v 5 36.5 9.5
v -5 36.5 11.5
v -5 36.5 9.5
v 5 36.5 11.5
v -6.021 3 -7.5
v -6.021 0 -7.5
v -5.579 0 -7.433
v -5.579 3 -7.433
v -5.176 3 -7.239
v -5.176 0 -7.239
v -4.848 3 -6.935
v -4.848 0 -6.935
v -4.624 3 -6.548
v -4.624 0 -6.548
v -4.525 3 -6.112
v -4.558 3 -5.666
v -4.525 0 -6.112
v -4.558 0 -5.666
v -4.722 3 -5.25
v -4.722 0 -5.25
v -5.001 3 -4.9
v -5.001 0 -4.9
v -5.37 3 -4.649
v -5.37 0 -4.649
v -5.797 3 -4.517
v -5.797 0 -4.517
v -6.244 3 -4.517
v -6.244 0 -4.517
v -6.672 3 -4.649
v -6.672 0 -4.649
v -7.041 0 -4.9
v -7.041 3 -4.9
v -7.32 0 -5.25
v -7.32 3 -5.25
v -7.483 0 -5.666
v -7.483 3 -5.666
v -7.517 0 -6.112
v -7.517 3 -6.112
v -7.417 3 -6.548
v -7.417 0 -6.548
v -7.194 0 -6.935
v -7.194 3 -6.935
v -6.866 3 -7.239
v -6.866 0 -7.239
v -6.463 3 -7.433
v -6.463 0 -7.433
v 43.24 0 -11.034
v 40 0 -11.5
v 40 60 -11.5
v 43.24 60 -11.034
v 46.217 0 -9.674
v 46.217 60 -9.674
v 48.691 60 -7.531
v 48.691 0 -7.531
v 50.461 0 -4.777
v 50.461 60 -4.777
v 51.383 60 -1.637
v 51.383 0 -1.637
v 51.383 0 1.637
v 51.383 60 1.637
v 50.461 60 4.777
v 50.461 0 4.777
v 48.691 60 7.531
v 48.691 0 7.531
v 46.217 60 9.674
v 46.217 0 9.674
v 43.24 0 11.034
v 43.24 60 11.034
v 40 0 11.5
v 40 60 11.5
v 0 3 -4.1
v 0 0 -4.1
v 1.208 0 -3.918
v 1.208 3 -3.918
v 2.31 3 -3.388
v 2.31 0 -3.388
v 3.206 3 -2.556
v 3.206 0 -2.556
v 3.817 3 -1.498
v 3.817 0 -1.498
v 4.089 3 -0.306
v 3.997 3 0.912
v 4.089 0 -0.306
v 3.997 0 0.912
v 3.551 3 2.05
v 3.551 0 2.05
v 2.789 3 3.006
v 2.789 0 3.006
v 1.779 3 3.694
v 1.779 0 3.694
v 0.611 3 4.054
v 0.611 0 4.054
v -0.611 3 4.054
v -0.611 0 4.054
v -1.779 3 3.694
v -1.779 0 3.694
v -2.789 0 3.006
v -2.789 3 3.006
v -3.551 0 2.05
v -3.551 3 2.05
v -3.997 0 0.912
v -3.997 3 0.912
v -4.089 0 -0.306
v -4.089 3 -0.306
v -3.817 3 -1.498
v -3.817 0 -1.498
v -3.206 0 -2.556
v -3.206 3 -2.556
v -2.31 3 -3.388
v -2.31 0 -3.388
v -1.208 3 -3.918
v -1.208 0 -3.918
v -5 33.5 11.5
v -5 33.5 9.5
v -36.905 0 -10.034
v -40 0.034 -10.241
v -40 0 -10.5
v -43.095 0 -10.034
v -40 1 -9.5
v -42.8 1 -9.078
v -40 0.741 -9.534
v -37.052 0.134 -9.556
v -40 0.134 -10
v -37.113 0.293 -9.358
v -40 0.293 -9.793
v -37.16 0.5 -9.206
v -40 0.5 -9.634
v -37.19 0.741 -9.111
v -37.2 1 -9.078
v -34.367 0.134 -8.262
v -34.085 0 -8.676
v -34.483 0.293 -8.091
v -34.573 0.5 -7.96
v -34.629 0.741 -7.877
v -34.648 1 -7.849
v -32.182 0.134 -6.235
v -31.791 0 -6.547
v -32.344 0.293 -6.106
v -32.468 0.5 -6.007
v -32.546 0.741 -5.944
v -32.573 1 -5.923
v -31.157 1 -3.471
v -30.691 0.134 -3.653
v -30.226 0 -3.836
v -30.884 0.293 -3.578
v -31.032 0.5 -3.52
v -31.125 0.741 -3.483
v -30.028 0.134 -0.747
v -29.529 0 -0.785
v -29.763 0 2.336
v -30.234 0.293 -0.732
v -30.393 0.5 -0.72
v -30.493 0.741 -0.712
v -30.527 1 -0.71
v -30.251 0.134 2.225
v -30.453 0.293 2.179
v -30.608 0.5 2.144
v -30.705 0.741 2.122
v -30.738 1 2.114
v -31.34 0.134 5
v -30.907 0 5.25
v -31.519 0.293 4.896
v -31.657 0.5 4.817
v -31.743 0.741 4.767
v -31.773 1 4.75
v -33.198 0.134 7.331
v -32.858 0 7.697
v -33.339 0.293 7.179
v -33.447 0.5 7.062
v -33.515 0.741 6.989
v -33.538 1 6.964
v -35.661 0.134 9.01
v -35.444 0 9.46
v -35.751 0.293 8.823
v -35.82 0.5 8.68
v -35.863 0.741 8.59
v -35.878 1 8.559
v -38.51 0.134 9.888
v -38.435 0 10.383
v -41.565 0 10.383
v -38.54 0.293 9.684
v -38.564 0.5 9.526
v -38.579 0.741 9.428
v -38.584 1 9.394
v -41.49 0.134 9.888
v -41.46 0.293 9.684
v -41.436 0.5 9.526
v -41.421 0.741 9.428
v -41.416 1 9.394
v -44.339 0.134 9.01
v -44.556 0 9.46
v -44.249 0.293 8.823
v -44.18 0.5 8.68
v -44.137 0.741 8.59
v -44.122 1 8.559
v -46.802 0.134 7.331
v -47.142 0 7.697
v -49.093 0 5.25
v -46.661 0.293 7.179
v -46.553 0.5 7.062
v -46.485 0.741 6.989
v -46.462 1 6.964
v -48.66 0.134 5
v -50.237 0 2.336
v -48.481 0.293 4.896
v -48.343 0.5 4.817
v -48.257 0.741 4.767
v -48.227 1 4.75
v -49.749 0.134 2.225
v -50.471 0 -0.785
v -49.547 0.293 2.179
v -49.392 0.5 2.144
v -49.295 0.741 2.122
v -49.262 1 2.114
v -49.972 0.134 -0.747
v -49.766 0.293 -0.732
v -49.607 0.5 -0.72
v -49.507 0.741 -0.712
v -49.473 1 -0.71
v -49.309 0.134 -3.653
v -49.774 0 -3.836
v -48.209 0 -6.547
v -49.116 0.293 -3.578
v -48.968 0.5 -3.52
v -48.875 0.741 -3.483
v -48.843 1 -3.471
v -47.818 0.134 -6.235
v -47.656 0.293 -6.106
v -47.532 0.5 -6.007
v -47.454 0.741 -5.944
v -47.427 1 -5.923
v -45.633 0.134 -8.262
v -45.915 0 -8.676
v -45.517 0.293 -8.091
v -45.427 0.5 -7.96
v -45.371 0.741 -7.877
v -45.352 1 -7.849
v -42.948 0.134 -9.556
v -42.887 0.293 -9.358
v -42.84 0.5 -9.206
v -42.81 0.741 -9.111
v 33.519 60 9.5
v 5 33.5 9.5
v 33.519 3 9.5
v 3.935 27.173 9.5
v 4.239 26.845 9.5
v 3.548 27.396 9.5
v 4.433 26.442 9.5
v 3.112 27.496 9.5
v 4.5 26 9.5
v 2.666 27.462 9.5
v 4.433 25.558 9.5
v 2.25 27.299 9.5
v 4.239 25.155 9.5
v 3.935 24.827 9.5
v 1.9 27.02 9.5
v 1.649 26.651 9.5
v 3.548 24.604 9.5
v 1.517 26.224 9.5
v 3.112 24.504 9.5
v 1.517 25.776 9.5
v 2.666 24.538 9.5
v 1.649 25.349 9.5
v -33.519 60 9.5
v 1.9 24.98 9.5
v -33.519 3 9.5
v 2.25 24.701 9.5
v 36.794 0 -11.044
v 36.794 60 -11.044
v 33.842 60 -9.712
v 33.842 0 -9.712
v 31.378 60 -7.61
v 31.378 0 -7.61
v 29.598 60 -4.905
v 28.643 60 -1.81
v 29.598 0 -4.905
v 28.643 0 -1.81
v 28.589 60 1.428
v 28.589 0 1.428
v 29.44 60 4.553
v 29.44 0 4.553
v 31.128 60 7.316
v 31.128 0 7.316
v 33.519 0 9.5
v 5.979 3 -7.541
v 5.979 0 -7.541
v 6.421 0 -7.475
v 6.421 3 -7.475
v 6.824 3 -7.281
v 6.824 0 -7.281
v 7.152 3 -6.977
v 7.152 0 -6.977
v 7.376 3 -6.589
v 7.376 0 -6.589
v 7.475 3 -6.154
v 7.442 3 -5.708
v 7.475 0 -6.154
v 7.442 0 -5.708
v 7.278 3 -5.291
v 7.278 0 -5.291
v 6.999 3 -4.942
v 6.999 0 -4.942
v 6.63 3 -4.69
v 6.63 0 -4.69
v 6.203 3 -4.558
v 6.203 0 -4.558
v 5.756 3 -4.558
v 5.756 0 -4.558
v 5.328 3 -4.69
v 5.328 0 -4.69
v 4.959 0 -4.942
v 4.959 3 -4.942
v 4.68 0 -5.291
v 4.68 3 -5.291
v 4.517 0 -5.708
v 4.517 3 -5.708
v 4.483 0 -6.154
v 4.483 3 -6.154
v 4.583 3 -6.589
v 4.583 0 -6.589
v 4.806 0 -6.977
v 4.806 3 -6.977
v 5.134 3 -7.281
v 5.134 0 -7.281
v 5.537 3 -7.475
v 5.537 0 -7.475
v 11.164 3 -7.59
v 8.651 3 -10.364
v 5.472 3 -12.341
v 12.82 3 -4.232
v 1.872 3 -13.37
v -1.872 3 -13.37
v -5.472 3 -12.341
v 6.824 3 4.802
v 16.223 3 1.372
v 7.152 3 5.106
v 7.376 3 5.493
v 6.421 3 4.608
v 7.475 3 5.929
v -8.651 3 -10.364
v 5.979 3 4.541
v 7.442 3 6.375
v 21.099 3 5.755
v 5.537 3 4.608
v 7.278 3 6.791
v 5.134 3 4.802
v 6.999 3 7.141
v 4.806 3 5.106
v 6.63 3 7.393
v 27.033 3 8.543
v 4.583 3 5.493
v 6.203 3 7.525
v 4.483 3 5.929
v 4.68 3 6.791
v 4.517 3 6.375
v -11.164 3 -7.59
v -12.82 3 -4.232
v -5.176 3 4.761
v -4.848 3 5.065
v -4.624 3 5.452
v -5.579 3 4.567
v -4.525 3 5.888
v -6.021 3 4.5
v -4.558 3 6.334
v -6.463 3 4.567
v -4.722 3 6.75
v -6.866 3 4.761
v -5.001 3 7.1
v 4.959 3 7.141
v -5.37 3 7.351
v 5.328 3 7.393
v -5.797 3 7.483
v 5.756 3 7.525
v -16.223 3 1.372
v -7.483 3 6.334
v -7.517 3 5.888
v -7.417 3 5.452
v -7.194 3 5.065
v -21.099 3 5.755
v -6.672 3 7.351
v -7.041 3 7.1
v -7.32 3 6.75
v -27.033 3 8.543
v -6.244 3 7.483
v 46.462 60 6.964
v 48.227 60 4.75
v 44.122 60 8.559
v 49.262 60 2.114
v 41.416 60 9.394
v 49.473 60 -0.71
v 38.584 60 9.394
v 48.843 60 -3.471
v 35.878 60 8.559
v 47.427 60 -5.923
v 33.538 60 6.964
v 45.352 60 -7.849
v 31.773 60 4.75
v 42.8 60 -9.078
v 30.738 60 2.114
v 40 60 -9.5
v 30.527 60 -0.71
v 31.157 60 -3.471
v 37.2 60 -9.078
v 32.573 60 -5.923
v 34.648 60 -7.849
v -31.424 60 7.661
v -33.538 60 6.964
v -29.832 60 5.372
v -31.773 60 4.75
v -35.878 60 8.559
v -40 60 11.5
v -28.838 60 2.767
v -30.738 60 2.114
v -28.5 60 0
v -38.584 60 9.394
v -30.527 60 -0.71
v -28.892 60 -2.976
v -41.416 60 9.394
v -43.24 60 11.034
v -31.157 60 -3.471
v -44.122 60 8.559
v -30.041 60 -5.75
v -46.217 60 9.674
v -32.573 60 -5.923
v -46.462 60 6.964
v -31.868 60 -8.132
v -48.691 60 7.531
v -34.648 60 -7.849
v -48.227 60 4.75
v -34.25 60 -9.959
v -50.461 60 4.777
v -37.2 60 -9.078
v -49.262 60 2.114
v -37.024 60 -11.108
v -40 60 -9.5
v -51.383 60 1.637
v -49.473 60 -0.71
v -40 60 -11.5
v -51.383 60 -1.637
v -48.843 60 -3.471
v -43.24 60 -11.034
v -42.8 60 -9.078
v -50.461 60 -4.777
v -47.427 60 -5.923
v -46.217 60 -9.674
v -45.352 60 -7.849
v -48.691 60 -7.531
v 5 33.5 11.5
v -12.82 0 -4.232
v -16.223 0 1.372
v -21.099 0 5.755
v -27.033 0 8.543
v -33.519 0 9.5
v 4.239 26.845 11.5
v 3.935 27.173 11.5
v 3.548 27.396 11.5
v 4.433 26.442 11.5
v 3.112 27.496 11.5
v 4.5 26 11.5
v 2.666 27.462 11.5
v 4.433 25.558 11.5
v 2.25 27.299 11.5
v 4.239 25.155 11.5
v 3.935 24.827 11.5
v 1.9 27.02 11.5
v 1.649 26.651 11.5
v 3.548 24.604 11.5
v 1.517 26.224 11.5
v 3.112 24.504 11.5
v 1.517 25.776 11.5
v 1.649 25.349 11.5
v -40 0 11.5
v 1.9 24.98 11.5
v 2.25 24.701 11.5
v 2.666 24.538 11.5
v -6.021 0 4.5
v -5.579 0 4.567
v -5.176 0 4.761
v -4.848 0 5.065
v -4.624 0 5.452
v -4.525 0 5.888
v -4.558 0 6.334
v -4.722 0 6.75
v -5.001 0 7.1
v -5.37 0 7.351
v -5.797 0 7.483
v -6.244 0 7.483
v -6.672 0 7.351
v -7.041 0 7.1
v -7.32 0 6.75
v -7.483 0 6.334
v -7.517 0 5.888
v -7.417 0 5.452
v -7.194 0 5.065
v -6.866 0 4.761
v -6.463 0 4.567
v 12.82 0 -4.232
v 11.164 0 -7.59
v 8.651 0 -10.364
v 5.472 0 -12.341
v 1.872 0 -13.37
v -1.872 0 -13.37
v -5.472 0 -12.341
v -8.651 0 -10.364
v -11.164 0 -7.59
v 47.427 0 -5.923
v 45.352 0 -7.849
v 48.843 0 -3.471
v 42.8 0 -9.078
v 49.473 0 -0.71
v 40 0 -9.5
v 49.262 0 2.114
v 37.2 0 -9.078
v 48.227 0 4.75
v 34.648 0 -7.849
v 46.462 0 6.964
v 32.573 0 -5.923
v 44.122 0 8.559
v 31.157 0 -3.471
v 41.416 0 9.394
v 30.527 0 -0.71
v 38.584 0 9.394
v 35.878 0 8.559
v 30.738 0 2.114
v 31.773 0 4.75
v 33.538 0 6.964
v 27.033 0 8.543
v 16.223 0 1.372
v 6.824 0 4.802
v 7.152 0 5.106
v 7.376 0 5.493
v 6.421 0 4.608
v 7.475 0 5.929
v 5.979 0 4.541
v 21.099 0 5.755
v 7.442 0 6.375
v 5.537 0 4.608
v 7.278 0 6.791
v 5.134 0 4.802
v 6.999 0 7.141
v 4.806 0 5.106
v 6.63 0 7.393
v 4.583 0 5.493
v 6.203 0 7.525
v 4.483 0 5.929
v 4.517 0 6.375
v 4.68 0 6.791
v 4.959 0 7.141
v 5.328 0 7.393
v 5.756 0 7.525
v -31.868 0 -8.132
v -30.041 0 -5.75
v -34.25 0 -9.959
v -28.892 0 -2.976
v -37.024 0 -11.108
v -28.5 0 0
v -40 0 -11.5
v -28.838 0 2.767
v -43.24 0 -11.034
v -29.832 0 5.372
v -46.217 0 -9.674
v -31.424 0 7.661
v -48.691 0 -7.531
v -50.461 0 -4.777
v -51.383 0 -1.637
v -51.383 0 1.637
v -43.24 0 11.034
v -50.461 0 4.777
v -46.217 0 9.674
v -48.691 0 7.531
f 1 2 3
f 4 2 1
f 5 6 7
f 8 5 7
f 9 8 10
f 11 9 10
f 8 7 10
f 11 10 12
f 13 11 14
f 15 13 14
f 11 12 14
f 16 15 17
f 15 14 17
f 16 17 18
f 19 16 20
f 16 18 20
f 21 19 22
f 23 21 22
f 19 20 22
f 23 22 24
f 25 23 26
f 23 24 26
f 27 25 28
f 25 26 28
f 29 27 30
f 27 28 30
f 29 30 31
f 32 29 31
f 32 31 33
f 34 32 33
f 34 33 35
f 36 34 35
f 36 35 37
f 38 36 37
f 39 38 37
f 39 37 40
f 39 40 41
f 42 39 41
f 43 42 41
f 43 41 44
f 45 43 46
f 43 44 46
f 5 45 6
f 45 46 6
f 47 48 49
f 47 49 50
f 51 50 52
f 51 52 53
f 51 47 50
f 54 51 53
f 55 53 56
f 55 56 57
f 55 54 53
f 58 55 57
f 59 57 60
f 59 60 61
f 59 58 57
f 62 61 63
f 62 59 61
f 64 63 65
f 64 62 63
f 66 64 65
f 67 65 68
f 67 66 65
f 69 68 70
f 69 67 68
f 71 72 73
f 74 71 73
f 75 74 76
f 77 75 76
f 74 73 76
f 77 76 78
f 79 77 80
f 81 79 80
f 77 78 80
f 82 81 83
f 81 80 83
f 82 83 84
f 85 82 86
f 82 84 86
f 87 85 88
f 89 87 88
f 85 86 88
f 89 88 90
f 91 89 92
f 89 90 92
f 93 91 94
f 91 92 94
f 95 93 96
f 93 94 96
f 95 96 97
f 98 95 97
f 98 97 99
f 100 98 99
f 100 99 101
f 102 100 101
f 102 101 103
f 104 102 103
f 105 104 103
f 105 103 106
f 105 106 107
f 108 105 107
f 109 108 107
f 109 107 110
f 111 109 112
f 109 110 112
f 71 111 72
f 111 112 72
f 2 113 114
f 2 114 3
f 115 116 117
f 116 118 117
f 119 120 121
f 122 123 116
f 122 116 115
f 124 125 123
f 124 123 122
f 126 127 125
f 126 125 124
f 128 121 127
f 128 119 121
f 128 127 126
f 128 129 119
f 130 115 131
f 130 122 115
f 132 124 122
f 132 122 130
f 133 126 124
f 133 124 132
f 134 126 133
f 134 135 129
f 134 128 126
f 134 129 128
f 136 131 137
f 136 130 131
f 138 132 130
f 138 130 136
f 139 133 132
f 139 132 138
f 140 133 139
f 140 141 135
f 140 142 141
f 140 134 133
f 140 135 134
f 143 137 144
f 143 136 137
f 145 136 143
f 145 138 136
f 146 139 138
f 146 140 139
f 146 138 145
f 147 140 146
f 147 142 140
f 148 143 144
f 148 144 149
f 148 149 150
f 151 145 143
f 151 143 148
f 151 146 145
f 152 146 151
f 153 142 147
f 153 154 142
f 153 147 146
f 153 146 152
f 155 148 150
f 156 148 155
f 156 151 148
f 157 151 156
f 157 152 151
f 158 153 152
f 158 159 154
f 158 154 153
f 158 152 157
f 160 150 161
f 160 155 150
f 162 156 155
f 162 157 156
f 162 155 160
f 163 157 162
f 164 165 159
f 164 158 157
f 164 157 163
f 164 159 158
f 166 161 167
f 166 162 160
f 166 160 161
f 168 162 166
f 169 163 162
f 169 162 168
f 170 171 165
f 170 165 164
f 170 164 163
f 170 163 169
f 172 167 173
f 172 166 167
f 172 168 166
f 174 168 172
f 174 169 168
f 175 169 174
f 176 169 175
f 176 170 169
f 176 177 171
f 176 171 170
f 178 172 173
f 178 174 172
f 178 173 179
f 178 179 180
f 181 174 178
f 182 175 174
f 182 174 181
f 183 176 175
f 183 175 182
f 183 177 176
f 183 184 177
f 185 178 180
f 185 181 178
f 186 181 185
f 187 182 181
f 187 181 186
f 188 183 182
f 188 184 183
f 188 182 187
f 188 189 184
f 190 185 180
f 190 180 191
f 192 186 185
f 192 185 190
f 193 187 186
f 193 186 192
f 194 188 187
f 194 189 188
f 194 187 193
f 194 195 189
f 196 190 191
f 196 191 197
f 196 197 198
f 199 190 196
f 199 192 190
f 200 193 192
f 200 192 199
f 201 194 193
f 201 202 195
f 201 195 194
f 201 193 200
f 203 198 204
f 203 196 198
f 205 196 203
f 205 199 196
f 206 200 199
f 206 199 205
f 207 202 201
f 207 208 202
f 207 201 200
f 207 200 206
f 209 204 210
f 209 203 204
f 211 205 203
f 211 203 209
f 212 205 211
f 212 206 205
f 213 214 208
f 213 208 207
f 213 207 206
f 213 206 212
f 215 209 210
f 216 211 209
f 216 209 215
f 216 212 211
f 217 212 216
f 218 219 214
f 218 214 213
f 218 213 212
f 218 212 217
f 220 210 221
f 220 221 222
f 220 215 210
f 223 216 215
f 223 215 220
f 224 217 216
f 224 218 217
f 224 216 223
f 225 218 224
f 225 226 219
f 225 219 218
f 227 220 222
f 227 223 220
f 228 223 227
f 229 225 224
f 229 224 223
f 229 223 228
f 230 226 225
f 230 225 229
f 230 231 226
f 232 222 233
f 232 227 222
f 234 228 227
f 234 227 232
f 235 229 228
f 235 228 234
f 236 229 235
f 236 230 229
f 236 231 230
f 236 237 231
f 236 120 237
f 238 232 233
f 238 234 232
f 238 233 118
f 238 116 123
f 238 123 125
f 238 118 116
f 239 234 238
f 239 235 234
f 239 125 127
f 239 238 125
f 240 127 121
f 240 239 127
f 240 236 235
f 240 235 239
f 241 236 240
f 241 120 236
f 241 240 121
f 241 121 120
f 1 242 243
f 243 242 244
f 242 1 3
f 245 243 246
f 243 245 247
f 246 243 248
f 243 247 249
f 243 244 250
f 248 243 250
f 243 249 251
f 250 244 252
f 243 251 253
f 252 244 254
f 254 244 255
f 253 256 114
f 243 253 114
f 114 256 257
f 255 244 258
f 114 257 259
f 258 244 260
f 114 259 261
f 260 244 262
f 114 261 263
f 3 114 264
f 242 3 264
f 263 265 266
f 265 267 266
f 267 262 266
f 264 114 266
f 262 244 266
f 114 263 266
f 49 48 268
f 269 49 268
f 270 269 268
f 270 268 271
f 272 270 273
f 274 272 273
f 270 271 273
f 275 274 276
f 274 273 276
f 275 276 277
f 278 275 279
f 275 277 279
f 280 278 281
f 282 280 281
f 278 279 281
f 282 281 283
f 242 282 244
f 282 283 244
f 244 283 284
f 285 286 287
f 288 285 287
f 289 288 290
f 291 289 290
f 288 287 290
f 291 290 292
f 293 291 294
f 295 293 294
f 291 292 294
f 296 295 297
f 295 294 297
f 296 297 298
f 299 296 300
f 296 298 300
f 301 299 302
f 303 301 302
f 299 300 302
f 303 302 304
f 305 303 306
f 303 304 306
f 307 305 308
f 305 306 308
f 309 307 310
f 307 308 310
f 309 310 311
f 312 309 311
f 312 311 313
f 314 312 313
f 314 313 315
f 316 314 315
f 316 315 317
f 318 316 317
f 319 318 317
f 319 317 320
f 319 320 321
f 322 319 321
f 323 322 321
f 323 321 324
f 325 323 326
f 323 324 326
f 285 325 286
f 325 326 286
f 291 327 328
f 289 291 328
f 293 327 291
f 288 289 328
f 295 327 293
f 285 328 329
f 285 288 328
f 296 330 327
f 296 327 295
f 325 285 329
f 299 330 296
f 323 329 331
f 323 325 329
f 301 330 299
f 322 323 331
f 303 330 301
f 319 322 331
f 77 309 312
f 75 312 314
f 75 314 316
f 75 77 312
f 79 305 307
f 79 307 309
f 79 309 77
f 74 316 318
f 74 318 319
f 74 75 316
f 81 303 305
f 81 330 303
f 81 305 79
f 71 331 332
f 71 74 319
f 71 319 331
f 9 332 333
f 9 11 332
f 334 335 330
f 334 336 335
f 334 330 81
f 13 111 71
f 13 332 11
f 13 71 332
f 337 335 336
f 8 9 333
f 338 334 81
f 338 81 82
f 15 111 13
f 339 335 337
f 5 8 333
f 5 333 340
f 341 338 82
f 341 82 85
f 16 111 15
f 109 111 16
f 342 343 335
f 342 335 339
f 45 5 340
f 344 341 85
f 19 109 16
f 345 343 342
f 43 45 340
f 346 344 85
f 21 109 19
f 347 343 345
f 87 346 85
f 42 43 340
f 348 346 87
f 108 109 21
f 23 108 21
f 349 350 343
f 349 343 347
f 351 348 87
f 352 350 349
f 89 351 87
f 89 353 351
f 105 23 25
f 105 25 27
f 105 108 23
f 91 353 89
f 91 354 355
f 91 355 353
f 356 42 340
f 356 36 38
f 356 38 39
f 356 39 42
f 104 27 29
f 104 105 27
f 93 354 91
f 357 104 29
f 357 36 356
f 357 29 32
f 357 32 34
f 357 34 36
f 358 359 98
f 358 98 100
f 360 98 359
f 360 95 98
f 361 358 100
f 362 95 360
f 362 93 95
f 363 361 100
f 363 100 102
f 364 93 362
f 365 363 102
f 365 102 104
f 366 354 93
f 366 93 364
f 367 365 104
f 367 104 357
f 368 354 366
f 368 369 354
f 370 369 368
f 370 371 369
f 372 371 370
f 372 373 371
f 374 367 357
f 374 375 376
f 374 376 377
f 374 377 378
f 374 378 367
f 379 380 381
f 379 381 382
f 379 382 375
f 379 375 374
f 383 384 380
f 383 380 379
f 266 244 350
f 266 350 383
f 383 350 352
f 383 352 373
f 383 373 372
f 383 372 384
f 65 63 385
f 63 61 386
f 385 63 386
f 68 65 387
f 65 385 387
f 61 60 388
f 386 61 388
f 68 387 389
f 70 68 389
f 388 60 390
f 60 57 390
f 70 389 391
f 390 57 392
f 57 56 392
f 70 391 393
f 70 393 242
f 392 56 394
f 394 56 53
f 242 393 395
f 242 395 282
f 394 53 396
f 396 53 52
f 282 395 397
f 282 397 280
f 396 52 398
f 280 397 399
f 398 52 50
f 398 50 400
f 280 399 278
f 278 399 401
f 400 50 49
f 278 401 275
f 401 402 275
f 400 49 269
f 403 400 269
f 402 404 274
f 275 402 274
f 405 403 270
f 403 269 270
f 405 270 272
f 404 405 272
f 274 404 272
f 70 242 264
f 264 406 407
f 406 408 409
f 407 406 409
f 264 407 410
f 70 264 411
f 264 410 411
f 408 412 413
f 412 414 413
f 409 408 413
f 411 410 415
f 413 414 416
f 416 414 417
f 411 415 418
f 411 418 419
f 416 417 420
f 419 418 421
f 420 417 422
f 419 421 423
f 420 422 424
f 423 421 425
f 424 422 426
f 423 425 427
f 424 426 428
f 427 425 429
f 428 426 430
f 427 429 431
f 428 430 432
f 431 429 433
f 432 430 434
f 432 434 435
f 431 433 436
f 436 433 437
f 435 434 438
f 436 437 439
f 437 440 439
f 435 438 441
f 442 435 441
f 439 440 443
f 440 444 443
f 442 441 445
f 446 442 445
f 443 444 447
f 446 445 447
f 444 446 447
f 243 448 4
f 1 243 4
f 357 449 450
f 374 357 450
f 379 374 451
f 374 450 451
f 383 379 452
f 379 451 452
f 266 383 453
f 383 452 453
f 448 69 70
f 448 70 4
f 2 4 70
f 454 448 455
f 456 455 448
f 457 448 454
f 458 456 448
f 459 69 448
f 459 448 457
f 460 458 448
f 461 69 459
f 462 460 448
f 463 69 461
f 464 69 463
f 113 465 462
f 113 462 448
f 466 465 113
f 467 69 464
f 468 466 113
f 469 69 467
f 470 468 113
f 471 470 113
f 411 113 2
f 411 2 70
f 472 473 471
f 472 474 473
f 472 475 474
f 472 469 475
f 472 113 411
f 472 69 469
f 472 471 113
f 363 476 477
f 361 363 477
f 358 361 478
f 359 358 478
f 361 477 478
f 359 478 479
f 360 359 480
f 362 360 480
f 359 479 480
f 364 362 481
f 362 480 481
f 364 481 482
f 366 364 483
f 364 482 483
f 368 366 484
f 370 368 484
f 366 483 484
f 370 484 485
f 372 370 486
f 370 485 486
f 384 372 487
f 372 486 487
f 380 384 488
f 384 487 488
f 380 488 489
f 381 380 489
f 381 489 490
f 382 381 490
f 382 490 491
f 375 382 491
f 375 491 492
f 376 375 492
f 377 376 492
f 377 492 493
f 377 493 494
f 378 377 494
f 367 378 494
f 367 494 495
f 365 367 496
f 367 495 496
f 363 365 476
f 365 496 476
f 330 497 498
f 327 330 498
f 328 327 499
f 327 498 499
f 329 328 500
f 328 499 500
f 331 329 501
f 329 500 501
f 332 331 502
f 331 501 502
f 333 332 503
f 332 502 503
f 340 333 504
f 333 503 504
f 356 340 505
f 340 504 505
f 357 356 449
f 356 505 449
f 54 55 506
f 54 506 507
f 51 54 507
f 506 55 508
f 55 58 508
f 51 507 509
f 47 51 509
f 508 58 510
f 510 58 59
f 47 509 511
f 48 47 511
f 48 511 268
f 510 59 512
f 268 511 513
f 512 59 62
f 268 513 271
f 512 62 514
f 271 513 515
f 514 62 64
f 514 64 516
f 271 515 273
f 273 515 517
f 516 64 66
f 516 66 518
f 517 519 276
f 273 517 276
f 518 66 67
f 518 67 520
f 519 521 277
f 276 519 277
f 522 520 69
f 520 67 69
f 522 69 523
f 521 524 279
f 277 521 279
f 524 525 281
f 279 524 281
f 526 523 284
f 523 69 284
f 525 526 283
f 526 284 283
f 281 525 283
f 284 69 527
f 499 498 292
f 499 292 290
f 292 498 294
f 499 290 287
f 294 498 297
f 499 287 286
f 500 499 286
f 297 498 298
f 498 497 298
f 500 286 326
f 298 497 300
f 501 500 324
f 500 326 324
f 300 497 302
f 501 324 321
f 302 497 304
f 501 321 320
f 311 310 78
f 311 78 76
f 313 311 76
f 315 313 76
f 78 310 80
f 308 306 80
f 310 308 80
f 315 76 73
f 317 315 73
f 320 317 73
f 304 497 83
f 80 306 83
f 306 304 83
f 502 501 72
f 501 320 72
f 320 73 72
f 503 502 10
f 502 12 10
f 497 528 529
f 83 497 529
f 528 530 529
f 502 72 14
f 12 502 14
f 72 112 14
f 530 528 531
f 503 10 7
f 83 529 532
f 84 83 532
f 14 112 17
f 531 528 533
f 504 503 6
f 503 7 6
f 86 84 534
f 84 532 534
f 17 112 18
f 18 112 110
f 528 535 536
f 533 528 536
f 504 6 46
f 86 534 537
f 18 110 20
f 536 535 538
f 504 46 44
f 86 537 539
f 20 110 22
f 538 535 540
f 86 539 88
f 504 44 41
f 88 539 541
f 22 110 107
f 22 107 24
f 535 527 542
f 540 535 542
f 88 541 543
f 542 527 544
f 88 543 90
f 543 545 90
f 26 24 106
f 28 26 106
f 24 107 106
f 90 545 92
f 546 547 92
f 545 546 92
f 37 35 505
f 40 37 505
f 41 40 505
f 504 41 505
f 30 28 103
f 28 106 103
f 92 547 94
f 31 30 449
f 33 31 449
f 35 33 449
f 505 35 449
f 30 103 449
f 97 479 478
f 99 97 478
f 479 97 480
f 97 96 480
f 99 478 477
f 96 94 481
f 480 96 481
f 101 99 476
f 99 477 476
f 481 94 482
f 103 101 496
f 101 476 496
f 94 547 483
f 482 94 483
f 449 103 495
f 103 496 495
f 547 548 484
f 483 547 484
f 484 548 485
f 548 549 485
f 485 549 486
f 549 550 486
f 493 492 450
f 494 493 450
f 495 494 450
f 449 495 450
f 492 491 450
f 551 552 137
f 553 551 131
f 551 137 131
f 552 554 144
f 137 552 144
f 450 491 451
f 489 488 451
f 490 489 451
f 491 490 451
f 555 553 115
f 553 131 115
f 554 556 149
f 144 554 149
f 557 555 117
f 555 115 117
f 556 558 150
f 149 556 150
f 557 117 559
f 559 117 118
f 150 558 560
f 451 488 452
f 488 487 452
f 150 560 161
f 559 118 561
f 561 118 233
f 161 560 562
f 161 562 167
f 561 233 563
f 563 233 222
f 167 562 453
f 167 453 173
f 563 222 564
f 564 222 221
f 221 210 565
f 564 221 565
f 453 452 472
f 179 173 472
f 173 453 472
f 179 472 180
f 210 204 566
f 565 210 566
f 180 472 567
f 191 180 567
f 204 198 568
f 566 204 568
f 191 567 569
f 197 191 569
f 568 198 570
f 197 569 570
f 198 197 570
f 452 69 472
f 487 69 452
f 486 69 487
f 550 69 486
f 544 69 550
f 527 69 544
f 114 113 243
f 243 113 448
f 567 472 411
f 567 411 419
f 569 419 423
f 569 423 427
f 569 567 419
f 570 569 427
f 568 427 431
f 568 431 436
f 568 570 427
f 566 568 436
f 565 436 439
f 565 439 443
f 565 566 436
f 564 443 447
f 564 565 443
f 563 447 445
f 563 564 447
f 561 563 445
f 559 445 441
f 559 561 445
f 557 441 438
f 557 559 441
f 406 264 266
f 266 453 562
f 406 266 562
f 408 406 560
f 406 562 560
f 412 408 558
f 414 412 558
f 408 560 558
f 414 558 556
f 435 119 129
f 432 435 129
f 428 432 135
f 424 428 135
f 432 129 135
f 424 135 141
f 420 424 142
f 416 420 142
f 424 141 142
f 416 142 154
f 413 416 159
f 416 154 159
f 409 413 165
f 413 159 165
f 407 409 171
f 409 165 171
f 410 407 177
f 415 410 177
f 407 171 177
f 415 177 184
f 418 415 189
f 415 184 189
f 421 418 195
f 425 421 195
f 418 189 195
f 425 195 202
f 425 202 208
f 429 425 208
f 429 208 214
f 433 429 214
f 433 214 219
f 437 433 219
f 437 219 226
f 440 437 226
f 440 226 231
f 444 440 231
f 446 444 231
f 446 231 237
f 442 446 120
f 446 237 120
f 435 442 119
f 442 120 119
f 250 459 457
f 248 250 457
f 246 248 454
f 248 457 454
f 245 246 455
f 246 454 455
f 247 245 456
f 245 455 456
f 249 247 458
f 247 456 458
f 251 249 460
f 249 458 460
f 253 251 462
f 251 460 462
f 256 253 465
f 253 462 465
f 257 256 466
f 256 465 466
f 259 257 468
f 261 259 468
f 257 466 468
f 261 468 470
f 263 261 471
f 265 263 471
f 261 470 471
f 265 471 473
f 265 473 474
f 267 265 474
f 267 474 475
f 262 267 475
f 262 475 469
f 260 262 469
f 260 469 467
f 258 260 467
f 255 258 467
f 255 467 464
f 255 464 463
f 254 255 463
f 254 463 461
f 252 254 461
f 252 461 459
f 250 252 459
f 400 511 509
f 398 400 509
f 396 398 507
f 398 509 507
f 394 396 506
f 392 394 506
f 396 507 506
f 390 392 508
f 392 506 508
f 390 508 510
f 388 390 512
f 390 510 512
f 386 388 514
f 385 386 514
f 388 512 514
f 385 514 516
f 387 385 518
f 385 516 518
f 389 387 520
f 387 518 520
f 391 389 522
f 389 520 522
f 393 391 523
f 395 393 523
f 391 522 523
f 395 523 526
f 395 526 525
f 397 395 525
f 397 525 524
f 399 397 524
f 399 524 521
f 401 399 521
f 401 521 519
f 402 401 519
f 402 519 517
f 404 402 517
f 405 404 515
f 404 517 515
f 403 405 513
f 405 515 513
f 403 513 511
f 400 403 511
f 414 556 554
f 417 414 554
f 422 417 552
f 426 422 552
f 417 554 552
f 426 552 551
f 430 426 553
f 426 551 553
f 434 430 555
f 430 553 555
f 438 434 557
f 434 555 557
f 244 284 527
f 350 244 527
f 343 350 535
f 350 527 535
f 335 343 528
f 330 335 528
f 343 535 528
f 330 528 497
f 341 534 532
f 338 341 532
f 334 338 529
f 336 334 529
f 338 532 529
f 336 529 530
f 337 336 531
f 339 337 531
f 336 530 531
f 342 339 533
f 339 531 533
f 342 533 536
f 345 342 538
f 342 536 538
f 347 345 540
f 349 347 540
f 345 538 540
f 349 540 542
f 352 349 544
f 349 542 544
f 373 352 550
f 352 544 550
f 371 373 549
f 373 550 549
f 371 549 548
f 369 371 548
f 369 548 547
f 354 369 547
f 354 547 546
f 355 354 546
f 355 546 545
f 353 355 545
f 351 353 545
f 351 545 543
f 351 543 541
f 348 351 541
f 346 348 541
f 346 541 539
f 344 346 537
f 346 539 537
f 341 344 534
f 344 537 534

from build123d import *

# Parameters (mm, degrees)
BOSS_EXTRUDE1_DEPTH = 60
SKETCH2_R           = 9.5
CUT_EXTRUDE1_DEPTH  = 60
CUT_EXTRUDE2_DEPTH  = 60
BOSS_EXTRUDE3_DEPTH = 3
SKETCH5_R           = 4.1
CUT_EXTRUDE3_DEPTH  = 3
SKETCH6_R           = 1.5
CUT_EXTRUDE4_DEPTH  = 3
SKETCH8_R           = 1.5
SKETCH8_W           = 10
SKETCH8_H           = 3
CUT_EXTRUDE5_DEPTH  = 3
FILLET1_R           = 1


with BuildPart() as part:
    # Sketch1 → Boss-Extrude1 (new body)
    with BuildSketch(Plane(origin=(0, 0, 0), x_dir=(1, 0, 0), z_dir=(0, 1, 0))):
        with BuildLine():
            Line((-40, 11.5), (40, 11.5))
            ThreePointArc((40, 11.5), (51.5, 0), (40, -11.5))
            Line((40, -11.5), (-40, -11.5))
            ThreePointArc((-40, -11.5), (-51.5, 0), (-40, 11.5))
        make_face()
    extrude(amount=BOSS_EXTRUDE1_DEPTH)

    # Sketch2 → Cut-Extrude1 (cut)
    with BuildSketch(Plane.XZ):
        with Locations(Location((-40, 0, 0), (0, 0, 270))):
            Circle(SKETCH2_R)
        with Locations(Location((40, 0, 0), (0, 0, 270))):
            Circle(SKETCH2_R)
    extrude(amount=-CUT_EXTRUDE1_DEPTH, mode=Mode.SUBTRACT)

    # Sketch3 → Cut-Extrude2 (cut)
    with BuildSketch(Plane.XZ):
        with BuildLine():
            Line((33.519259302, 9.5), (-33.519259302, 9.5))
            ThreePointArc((-33.519259302, 9.5), (-29.831949104, 5.372219372), (-28.5, 0))
            ThreePointArc((-28.5, 0), (-31.868272016, -8.131727984), (-40, -11.5))
            Line((-40, -11.5), (40, -11.5))
            ThreePointArc((40, -11.5), (29.011369512, -3.391164992), (33.519259302, 9.5))
        make_face()
    extrude(amount=-CUT_EXTRUDE2_DEPTH, mode=Mode.SUBTRACT)

    # Sketch4 → Boss-Extrude3 (add)
    with BuildSketch(Plane.XZ):
        with BuildLine():
            Line((-33.519259302, 9.5), (33.519259302, 9.5))
            ThreePointArc((33.519259302, 9.5), (21.099049386, 5.75486124), (12.819526766, -4.231989308))
            ThreePointArc((12.819526766, -4.231989308), (0, -13.5), (-12.819526766, -4.231989308))
            ThreePointArc((-12.819526766, -4.231989308), (-21.099049386, 5.75486124), (-33.519259302, 9.5))
        make_face()
    extrude(amount=-BOSS_EXTRUDE3_DEPTH)

    # Sketch5 → Cut-Extrude3 (cut)
    with BuildSketch(Plane.XZ):
        with Locations(Location((0, 0, 0), (0, 0, 270))):
            Circle(SKETCH5_R)
    extrude(amount=-CUT_EXTRUDE3_DEPTH, mode=Mode.SUBTRACT)

    # Sketch6 → Cut-Extrude4 (cut)
    with BuildSketch(Plane.XZ):
        with Locations(Location((5.979202711, -6.041451394, 0), (0, 0, 270))):
            Circle(SKETCH6_R)
        with Locations(Location((-6.020797289, -6, 0), (0, 0, 270))):
            Circle(SKETCH6_R)
        with Locations(Location((-6.020797289, 6, 0), (0, 0, 270))):
            Circle(SKETCH6_R)
        with Locations(Location((5.979202711, 6.041451394, 0), (0, 0, 270))):
            Circle(SKETCH6_R)
    extrude(amount=-CUT_EXTRUDE4_DEPTH, mode=Mode.SUBTRACT)

    # Sketch8 → Cut-Extrude5 (cut)
    with BuildSketch(Plane.XY.offset(11.5)):
        with Locations((3, 26)):
            Circle(SKETCH8_R)
        with Locations((0, 35)):
            Rectangle(SKETCH8_W, SKETCH8_H)
    extrude(amount=-CUT_EXTRUDE5_DEPTH, mode=Mode.SUBTRACT)

    # Fillet1
    fillet1_edges = [part.edges().sort_by_distance(p)[0] for p in [
        (-40, 0, 9.5),
    ]]
    fillet(fillet1_edges, radius=FILLET1_R)


solid = part.part
